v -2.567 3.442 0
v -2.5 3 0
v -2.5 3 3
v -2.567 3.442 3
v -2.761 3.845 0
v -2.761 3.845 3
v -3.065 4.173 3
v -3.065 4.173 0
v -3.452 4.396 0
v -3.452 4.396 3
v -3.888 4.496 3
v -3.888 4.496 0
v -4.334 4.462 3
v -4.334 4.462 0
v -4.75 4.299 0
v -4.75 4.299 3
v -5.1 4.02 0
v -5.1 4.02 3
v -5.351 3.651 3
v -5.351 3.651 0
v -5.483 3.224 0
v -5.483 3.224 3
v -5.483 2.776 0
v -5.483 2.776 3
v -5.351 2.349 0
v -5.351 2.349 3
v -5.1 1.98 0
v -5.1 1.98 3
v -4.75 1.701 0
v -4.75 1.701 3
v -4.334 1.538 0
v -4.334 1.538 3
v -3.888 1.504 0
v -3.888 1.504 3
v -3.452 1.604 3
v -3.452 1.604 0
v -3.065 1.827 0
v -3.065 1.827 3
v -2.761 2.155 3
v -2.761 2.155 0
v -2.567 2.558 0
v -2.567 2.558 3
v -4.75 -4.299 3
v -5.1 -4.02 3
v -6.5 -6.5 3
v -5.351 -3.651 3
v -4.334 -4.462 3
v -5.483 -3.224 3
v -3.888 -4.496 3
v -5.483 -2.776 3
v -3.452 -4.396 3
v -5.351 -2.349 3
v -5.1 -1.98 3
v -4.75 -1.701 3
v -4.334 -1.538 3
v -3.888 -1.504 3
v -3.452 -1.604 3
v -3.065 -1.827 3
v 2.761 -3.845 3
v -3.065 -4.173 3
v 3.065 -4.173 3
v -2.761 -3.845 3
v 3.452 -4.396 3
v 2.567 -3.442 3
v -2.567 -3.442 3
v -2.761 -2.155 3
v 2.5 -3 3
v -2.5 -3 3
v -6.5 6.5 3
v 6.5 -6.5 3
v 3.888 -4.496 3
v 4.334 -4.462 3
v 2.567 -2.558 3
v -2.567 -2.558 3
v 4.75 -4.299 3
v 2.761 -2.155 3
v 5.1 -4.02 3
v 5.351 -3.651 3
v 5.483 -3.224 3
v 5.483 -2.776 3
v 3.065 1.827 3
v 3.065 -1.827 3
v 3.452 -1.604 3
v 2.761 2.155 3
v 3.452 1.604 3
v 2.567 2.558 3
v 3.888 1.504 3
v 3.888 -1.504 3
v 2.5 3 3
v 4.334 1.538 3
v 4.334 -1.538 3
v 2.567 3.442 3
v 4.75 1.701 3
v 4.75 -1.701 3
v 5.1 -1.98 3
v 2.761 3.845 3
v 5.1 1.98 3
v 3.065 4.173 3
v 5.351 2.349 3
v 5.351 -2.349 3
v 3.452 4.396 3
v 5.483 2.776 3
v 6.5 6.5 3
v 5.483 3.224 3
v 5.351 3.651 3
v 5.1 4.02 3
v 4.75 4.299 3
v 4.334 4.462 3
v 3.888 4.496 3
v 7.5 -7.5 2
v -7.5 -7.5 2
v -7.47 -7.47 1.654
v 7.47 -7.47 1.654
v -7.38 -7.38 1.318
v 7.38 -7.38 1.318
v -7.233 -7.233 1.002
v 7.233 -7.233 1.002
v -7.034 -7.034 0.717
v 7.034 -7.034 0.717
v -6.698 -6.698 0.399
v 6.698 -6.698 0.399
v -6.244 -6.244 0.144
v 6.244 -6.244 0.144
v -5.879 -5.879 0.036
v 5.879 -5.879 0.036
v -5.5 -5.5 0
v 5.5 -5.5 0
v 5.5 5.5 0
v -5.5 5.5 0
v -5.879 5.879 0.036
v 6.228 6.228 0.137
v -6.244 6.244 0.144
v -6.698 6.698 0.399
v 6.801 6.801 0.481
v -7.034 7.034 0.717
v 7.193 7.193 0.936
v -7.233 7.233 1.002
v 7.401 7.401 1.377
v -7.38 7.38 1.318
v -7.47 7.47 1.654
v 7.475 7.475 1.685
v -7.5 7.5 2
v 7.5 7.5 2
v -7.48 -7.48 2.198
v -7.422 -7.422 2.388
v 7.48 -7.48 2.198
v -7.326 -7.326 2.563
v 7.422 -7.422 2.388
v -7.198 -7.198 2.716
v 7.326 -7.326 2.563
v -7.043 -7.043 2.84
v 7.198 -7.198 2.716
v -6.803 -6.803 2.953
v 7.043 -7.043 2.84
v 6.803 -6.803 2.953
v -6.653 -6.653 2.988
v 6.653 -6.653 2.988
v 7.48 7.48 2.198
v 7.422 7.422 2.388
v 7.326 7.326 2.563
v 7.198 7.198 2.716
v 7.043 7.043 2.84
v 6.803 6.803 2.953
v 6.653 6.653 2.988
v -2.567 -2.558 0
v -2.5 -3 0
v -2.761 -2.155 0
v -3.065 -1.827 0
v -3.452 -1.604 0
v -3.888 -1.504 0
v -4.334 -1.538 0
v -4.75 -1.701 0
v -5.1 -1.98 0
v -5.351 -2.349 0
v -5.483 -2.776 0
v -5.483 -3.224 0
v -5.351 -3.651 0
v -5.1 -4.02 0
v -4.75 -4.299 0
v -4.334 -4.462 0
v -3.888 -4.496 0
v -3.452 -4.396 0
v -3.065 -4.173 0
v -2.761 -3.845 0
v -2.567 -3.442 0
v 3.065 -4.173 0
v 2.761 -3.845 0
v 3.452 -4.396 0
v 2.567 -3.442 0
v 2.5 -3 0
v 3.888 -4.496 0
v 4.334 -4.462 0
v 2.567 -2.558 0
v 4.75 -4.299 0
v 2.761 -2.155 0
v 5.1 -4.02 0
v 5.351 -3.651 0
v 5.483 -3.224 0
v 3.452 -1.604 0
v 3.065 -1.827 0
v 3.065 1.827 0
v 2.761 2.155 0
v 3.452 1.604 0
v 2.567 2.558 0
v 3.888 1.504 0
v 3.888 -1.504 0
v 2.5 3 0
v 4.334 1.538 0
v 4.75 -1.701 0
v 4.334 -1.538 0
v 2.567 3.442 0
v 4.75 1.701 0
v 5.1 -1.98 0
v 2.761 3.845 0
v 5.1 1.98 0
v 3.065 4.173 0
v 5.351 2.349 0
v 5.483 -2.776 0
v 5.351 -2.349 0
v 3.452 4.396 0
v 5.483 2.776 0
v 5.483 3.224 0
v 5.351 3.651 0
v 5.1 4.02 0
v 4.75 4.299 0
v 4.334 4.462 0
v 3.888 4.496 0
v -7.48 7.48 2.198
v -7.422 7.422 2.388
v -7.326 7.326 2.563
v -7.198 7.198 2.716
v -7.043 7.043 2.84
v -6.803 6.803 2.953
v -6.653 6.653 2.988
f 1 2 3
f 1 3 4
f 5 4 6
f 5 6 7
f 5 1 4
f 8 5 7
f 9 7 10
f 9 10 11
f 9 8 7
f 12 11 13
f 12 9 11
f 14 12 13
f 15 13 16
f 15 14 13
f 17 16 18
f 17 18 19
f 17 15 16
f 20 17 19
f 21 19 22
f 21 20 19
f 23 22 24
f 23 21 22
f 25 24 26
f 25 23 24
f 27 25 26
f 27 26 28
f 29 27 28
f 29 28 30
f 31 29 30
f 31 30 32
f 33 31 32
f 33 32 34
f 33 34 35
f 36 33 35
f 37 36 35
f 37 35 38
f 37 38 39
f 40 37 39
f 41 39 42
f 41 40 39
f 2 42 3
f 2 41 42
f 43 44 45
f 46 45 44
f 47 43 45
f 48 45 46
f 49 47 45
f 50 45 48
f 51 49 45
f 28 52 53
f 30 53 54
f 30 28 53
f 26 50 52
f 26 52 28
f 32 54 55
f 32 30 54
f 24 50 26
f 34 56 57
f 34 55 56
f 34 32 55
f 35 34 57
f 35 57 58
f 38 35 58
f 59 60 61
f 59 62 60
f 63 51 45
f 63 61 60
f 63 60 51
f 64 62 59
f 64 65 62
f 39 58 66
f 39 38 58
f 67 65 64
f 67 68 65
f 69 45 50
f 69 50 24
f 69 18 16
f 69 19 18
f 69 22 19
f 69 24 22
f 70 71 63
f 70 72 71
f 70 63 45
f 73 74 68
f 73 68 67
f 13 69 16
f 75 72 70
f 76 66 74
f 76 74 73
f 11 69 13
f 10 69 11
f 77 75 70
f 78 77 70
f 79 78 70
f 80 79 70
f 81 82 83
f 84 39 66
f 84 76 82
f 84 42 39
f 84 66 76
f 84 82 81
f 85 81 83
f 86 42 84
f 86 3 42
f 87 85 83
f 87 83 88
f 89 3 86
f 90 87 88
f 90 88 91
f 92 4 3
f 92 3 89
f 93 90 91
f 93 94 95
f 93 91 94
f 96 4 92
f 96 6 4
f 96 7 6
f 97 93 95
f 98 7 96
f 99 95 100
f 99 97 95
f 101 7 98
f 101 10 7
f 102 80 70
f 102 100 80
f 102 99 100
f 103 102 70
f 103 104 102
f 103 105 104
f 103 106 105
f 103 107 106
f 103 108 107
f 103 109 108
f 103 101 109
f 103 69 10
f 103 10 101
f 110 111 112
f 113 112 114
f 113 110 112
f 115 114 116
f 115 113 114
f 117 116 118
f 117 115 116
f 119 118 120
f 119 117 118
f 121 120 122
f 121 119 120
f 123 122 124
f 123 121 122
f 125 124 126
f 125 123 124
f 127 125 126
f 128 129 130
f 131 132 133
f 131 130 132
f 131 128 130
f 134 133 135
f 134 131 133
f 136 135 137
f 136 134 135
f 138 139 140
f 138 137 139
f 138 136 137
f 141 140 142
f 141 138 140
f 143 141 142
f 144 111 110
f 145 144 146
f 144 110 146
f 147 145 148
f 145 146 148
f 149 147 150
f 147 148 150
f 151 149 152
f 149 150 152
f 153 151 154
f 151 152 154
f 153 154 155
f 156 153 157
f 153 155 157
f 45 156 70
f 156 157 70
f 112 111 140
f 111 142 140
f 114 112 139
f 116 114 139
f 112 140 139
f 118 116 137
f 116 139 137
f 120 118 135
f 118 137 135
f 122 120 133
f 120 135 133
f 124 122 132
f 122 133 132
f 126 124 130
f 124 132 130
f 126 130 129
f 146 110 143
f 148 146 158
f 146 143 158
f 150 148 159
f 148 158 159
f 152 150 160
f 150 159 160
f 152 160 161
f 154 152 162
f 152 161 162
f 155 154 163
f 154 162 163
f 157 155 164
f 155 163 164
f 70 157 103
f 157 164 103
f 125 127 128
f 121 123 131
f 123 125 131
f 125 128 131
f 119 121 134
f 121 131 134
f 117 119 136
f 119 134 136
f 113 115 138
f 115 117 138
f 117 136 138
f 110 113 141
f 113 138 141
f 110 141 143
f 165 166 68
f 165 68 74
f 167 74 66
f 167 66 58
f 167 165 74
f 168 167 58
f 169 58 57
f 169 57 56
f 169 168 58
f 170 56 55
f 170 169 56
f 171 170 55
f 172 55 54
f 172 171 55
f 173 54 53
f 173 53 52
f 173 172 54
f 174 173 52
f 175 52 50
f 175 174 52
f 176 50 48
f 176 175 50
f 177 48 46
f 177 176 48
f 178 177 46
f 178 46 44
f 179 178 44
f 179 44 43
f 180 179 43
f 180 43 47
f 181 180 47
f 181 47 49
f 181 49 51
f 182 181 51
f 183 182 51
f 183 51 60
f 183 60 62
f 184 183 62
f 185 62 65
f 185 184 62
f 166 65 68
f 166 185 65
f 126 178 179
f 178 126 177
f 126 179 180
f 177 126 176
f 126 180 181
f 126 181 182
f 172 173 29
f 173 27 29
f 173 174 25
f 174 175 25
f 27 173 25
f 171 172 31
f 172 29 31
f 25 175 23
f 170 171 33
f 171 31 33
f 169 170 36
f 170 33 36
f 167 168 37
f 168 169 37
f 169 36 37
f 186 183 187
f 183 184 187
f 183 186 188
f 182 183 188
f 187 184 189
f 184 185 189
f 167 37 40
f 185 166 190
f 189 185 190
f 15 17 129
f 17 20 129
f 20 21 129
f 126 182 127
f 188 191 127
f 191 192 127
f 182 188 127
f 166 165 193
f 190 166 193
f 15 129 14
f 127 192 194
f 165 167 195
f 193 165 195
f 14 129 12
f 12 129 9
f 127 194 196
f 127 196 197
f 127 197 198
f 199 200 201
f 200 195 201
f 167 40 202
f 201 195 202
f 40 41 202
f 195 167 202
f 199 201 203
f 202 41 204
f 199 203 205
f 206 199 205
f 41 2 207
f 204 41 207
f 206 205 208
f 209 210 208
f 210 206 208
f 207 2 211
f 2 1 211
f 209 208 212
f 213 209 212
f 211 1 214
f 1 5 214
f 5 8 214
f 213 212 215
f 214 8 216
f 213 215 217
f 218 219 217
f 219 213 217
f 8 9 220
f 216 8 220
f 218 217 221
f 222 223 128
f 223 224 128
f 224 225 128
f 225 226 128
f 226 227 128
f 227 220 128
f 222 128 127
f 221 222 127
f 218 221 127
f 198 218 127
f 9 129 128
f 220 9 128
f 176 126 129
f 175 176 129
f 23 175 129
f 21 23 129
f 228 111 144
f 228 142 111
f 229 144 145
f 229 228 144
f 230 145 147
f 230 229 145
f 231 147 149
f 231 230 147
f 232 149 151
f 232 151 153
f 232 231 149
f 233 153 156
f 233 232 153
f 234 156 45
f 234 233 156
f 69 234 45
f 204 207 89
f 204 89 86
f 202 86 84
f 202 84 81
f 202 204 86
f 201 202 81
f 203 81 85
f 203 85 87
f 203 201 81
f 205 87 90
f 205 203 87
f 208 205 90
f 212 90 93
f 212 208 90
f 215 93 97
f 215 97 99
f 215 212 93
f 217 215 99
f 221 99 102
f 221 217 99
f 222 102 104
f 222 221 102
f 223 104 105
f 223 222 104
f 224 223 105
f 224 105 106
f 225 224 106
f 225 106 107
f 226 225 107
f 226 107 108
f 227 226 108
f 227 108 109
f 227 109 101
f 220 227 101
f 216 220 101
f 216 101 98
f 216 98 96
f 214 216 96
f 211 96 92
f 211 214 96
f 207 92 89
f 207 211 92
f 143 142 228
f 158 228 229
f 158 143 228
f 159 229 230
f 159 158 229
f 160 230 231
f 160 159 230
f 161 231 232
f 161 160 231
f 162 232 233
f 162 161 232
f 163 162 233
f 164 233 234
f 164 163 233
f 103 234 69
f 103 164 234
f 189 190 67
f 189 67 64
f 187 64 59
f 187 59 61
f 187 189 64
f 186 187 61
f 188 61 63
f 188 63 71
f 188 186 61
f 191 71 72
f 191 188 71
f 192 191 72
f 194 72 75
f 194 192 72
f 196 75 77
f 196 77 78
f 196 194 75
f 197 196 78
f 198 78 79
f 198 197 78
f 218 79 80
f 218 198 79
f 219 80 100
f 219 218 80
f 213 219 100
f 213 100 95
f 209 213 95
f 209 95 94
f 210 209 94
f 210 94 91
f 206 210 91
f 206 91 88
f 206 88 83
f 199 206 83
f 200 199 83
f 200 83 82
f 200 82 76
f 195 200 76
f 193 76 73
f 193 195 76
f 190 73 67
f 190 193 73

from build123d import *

# Parameters (mm, degrees)
SKETCH1_W           = 15
SKETCH1_H           = 15
SKETCH1_R           = 1.5
BOSS_EXTRUDE1_DEPTH = 3
FILLET3_R           = 1
FILLET4_R           = 2


with BuildPart() as part:
    # Sketch1 → Boss-Extrude1 (new body)
    with BuildSketch(Plane.XY):
        Rectangle(SKETCH1_W, SKETCH1_H)
        with Locations((-4, 3)):
            Circle(SKETCH1_R, mode=Mode.SUBTRACT)
        with Locations((-4, -3)):
            Circle(SKETCH1_R, mode=Mode.SUBTRACT)
        with Locations(Location((4, -3, 0), (0, 0, 180))):
            Circle(SKETCH1_R, mode=Mode.SUBTRACT)
        with Locations(Location((4, 3, 0), (0, 0, 180))):
            Circle(SKETCH1_R, mode=Mode.SUBTRACT)
    extrude(amount=BOSS_EXTRUDE1_DEPTH)

    # Fillet3
    fillet3_edges = [part.edges().sort_by_distance(p)[0] for p in [
        (-7.5, 0, 3),
        (0, -7.5, 3),
        (7.5, 0, 3),
        (0, 7.5, 3),
    ]]
    fillet(fillet3_edges, radius=FILLET3_R)

    # Fillet4
    fillet4_edges = [part.edges().sort_by_distance(p)[0] for p in [
        (0, -7.5, 0),
        (-7.5, 0, 0),
        (7.5, 0, 0),
        (0, 7.5, 0),
    ]]
    fillet(fillet4_edges, radius=FILLET4_R - 0.0001)  # a hair under: the kernel refuses the full size


solid = part.part
